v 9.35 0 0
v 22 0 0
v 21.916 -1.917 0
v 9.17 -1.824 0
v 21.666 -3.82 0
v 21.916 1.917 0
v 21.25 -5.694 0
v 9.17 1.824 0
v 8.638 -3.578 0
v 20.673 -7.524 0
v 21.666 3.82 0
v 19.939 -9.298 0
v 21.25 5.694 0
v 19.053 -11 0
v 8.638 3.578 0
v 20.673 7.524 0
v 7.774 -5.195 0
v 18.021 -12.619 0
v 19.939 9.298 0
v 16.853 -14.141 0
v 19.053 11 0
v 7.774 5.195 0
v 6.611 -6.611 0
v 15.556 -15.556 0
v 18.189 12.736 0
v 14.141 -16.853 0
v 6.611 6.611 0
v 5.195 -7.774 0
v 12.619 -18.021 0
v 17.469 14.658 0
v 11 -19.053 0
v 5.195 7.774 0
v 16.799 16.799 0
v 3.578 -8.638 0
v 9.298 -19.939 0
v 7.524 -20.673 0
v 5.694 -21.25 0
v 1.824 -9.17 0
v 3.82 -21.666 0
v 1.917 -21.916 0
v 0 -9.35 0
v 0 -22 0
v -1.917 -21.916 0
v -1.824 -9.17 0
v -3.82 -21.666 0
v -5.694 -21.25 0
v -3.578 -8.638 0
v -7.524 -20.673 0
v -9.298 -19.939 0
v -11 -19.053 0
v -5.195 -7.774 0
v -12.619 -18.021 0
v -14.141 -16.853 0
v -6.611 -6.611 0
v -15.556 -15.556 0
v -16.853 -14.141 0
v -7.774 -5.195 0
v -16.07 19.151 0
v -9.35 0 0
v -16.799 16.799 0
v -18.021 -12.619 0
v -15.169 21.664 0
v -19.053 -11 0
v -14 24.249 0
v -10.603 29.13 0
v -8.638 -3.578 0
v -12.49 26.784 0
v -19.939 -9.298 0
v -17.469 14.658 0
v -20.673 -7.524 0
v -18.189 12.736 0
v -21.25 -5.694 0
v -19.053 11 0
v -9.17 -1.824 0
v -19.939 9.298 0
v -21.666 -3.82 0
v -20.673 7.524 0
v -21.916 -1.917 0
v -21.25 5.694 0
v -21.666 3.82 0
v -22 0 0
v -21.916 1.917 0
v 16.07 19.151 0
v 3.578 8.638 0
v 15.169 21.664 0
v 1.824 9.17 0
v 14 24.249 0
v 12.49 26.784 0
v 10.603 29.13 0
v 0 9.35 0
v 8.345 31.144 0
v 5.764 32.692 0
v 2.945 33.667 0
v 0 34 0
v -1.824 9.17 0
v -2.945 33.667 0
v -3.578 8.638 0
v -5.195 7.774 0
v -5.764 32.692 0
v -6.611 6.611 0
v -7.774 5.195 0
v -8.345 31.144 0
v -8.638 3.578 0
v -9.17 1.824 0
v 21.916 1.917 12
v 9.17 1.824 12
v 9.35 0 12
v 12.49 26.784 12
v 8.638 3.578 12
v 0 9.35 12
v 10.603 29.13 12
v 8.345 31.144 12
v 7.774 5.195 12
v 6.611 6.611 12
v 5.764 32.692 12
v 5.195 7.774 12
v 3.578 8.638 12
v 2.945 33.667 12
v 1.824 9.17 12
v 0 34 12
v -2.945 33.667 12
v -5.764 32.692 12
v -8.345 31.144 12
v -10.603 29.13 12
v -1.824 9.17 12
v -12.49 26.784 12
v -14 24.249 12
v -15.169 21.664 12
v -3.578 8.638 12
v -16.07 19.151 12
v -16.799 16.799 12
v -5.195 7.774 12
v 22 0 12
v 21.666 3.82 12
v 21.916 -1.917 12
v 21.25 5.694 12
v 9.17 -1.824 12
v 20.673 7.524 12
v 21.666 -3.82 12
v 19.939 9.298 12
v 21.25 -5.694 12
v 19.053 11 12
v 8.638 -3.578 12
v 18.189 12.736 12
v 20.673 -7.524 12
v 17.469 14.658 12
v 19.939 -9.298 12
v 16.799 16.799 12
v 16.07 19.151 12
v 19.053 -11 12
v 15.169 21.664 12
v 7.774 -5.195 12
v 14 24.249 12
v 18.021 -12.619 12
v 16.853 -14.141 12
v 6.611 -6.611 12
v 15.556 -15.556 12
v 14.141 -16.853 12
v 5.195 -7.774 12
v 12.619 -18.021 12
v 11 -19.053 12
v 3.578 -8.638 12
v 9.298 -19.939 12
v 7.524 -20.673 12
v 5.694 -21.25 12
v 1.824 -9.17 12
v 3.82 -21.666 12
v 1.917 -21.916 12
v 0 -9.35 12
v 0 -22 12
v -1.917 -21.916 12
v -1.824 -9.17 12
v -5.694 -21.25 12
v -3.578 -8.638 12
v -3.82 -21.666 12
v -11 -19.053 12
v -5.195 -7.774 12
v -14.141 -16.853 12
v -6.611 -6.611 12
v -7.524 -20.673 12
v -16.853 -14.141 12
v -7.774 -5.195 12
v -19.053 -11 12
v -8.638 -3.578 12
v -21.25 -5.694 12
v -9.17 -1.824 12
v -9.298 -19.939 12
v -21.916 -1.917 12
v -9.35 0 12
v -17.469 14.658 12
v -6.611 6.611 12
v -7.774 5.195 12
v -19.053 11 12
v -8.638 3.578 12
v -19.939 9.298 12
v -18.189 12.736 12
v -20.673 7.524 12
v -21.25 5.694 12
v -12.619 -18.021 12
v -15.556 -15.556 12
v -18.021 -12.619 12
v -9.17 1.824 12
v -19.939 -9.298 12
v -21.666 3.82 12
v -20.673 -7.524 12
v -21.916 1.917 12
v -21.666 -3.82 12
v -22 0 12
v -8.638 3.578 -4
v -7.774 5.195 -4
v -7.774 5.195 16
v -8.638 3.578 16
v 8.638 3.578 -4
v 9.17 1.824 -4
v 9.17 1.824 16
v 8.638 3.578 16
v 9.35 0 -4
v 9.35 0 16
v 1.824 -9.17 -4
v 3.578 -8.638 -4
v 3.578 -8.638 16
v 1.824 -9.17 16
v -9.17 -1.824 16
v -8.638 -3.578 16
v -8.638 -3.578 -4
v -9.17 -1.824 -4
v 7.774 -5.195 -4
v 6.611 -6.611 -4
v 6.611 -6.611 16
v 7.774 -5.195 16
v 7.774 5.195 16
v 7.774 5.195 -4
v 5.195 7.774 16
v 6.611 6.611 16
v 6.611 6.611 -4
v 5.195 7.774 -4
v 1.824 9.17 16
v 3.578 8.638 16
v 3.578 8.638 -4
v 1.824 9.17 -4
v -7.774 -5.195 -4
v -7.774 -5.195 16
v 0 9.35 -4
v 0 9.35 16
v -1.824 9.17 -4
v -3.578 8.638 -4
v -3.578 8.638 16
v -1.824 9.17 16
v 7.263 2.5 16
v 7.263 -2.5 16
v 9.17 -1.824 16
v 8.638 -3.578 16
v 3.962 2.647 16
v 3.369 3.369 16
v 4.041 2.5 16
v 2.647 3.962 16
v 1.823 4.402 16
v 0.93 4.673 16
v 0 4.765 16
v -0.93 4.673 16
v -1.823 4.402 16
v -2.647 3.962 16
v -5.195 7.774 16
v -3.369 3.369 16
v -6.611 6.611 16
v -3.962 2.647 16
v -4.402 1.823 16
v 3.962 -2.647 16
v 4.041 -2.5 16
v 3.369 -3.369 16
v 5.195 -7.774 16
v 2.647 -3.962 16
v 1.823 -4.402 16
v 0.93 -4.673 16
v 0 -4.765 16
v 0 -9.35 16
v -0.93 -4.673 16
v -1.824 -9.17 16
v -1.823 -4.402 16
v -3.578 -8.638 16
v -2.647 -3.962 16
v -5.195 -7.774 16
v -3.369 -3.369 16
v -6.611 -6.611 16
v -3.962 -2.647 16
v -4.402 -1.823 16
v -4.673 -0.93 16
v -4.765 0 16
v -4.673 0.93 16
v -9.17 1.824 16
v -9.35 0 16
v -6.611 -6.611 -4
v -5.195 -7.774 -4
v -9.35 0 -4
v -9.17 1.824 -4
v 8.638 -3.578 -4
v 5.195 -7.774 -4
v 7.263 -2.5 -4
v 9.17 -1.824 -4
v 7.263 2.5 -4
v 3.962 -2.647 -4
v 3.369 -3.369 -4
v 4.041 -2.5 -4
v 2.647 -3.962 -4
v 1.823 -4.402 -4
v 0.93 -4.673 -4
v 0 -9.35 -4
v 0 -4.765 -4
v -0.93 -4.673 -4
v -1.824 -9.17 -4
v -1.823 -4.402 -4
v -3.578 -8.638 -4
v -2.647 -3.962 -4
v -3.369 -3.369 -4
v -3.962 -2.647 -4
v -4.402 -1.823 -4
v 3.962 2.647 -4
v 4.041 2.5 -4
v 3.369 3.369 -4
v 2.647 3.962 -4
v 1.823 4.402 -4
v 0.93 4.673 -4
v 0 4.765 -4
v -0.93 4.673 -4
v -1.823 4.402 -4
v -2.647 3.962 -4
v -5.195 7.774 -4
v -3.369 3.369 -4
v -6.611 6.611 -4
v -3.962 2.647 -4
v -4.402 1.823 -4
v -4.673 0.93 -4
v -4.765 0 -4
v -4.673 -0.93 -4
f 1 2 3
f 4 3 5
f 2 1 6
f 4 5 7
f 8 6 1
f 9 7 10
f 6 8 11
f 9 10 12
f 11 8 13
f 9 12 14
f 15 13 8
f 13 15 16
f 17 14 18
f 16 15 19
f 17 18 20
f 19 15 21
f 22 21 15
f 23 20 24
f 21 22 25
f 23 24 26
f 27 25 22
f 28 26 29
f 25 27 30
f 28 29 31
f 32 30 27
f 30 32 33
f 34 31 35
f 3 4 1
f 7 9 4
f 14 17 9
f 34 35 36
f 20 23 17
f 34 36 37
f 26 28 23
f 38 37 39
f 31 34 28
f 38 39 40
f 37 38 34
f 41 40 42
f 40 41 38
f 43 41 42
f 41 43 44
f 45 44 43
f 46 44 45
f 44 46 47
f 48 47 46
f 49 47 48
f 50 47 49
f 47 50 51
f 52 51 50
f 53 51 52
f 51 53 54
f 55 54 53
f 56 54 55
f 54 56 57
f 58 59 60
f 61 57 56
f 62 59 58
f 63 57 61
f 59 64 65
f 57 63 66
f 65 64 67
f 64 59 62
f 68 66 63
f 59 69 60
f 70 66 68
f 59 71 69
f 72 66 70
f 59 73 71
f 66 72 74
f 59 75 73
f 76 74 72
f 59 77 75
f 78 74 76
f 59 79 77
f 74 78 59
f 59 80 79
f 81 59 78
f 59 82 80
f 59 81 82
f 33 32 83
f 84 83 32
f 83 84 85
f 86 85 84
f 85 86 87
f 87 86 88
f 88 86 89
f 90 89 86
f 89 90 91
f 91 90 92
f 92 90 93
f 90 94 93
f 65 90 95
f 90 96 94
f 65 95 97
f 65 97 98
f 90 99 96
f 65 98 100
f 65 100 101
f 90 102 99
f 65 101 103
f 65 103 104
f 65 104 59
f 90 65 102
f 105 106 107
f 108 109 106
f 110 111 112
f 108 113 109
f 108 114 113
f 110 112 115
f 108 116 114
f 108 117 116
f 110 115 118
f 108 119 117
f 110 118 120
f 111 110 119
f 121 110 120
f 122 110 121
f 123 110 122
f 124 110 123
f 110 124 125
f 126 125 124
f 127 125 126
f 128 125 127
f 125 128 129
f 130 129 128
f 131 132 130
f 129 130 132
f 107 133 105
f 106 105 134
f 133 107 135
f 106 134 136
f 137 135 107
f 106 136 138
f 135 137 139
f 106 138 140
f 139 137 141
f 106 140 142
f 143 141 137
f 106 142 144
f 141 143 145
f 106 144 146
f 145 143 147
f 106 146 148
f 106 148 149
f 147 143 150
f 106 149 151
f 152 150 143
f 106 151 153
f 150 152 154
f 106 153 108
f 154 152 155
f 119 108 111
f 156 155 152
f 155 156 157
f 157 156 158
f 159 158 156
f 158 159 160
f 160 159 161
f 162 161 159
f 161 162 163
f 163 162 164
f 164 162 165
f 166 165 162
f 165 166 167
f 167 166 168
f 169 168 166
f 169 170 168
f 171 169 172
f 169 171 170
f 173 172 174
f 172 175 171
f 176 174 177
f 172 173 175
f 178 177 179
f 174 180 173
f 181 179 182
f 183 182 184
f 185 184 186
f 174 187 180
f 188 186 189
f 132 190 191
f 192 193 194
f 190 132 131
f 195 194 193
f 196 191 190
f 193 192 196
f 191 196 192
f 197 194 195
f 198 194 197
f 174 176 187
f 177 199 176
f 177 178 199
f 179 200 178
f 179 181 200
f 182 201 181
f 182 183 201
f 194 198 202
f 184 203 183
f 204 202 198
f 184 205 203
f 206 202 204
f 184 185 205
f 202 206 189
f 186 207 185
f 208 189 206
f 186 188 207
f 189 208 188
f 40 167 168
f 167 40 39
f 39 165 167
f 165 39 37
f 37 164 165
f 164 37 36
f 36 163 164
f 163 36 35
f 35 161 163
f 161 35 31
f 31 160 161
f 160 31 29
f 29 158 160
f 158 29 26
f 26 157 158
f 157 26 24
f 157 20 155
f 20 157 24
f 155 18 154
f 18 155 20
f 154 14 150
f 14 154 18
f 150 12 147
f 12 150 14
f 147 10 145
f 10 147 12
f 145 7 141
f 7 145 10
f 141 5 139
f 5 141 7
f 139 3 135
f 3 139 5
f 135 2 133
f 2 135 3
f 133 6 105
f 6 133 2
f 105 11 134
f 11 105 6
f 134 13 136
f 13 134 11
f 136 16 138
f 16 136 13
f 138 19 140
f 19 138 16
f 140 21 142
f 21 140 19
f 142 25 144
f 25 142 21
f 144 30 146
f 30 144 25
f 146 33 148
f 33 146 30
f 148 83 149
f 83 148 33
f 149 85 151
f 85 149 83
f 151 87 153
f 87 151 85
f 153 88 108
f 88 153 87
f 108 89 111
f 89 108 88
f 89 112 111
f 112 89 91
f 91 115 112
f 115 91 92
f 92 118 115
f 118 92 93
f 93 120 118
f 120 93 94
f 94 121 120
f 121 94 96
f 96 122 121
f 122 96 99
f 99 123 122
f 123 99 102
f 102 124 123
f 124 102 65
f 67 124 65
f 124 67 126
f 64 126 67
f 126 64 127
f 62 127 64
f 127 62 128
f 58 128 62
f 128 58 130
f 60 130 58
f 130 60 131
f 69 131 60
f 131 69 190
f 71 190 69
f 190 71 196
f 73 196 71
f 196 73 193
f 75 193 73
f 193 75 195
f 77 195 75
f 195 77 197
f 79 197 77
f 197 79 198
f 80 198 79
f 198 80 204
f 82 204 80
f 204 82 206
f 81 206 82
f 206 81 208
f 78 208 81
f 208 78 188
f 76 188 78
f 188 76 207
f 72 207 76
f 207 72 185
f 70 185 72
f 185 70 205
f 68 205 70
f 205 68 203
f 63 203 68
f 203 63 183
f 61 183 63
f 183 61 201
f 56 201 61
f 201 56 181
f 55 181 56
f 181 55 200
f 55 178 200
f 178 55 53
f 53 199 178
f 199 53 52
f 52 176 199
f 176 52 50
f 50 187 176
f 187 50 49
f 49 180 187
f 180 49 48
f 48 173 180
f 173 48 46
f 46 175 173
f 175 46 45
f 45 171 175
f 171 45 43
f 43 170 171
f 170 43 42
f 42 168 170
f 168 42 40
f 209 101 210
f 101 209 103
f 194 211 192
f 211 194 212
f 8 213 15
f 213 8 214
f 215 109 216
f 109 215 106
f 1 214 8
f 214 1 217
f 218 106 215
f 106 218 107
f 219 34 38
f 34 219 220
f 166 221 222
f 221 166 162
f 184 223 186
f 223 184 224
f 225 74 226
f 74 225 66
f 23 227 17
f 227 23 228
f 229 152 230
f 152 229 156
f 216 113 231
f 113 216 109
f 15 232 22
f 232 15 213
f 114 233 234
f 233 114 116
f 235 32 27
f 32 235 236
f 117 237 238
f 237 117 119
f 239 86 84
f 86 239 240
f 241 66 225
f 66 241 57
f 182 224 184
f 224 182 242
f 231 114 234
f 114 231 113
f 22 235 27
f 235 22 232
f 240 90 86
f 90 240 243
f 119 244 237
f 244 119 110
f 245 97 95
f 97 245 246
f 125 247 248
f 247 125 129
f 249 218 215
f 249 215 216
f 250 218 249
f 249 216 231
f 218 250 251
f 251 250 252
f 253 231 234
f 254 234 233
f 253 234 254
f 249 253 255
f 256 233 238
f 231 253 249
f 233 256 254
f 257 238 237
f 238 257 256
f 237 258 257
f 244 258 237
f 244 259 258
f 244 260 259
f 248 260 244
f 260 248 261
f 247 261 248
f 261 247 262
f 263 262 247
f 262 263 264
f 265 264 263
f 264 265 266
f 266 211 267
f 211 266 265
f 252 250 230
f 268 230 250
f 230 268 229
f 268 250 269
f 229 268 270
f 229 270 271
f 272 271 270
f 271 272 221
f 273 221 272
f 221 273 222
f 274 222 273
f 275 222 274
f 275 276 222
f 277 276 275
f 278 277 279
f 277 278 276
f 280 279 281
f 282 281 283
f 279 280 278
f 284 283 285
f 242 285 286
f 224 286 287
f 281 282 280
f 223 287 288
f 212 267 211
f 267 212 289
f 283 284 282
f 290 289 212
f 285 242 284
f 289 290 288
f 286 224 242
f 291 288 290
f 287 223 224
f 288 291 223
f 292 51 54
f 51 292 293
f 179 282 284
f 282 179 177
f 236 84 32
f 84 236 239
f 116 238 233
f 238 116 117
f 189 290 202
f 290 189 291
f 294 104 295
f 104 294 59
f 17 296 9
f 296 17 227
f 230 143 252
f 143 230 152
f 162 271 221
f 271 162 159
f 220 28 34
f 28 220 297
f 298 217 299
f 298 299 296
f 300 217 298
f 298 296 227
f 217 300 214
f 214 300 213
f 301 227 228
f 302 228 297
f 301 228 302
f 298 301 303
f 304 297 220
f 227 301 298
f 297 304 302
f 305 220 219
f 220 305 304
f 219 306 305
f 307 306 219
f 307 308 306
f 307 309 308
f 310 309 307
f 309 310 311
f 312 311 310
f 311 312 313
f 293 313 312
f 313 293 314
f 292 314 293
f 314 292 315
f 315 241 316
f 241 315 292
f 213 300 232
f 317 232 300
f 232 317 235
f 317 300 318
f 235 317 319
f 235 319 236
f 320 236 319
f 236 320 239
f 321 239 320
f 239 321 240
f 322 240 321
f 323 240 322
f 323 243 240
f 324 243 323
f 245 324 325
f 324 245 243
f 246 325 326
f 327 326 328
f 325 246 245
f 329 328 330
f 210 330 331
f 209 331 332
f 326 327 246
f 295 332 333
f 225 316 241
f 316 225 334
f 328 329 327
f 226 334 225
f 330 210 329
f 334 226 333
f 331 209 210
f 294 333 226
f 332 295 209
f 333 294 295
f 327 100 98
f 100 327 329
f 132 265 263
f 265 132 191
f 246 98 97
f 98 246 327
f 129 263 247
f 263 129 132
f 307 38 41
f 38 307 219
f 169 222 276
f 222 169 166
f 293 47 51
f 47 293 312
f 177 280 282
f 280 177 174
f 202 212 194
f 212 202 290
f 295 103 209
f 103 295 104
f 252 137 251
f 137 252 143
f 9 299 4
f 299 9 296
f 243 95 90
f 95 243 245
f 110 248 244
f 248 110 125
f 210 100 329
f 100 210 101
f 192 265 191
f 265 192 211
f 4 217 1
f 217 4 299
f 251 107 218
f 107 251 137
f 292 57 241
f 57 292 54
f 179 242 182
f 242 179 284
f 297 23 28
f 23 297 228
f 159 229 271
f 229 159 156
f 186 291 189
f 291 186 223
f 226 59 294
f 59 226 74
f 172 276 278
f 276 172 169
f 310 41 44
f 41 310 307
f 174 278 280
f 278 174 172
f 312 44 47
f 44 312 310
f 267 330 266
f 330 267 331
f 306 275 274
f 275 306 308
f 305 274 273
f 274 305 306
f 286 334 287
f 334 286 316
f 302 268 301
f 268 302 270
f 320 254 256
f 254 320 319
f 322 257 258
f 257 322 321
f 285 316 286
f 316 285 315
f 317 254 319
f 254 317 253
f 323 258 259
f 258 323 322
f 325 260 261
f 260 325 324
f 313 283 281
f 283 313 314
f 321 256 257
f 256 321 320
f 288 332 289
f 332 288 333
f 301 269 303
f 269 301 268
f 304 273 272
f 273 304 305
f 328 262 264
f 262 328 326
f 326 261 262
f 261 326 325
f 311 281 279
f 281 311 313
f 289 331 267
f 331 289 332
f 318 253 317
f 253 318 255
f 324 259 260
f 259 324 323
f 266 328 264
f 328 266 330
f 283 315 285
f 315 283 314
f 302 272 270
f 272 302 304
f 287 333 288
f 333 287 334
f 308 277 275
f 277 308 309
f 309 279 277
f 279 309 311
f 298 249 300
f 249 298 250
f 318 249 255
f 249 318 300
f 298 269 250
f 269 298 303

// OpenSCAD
$fn = 32;

// ----------------------------------------------------------------------
// Cam: base radius 22 mm with a 12 mm lift over 120 degrees
// ----------------------------------------------------------------------

// --- parameters (mm) ---
base_r = 22;              // base radius
lift = 12;                // lift height above the base radius
lift_span = 120;          // angular width of the lift
lift_start = 30;          // angle where the lift starts
cam_t = 12;               // cam plate thickness
hub_d = 18.7;             // hub diameter
hub_h = 20;               // hub height
bore_d = 9.53;            // bore
key_w = 5;                // keyway width
key_depth = 2.5;          // keyway depth

cam_profile = [[22, 0], [21.916, 1.917], [21.666, 3.82], [21.25, 5.694], [20.673, 7.524], [19.939, 9.298], [19.053, 11], [18.189, 12.736], [17.469, 14.658], [16.799, 16.799], [16.07, 19.151], [15.169, 21.664], [14, 24.249], [12.49, 26.784], [10.603, 29.13], [8.345, 31.144], [5.764, 32.692], [2.945, 33.667], [0, 34], [-2.945, 33.667], [-5.764, 32.692], [-8.345, 31.144], [-10.603, 29.13], [-12.49, 26.784], [-14, 24.249], [-15.169, 21.664], [-16.07, 19.151], [-16.799, 16.799], [-17.469, 14.658], [-18.189, 12.736], [-19.053, 11], [-19.939, 9.298], [-20.673, 7.524], [-21.25, 5.694], [-21.666, 3.82], [-21.916, 1.917], [-22, 0], [-21.916, -1.917], [-21.666, -3.82], [-21.25, -5.694], [-20.673, -7.524], [-19.939, -9.298], [-19.053, -11], [-18.021, -12.619], [-16.853, -14.141], [-15.556, -15.556], [-14.141, -16.853], [-12.619, -18.021], [-11, -19.053], [-9.298, -19.939], [-7.524, -20.673], [-5.694, -21.25], [-3.82, -21.666], [-1.917, -21.916], [0, -22], [1.917, -21.916], [3.82, -21.666], [5.694, -21.25], [7.524, -20.673], [9.298, -19.939], [11, -19.053], [12.619, -18.021], [14.141, -16.853], [15.556, -15.556], [16.853, -14.141], [18.021, -12.619], [19.053, -11], [19.939, -9.298], [20.673, -7.524], [21.25, -5.694], [21.666, -3.82], [21.916, -1.917]];

difference() {
  union() {
    linear_extrude(height = cam_t) polygon(cam_profile);
    /* hub, proud of the cam plate on both sides */
    translate([0, 0, -4]) cylinder(h = hub_h, d = hub_d);
  }
  /* bore through the hub, 2.5 mm clear on both faces */
  translate([0, 0, -6.5]) cylinder(h = hub_h + 5, d = bore_d);
  /* keyway, milled through the whole hub */
  translate([2.263, -2.5, -6.5]) cube([5, 5, 25]);
}
